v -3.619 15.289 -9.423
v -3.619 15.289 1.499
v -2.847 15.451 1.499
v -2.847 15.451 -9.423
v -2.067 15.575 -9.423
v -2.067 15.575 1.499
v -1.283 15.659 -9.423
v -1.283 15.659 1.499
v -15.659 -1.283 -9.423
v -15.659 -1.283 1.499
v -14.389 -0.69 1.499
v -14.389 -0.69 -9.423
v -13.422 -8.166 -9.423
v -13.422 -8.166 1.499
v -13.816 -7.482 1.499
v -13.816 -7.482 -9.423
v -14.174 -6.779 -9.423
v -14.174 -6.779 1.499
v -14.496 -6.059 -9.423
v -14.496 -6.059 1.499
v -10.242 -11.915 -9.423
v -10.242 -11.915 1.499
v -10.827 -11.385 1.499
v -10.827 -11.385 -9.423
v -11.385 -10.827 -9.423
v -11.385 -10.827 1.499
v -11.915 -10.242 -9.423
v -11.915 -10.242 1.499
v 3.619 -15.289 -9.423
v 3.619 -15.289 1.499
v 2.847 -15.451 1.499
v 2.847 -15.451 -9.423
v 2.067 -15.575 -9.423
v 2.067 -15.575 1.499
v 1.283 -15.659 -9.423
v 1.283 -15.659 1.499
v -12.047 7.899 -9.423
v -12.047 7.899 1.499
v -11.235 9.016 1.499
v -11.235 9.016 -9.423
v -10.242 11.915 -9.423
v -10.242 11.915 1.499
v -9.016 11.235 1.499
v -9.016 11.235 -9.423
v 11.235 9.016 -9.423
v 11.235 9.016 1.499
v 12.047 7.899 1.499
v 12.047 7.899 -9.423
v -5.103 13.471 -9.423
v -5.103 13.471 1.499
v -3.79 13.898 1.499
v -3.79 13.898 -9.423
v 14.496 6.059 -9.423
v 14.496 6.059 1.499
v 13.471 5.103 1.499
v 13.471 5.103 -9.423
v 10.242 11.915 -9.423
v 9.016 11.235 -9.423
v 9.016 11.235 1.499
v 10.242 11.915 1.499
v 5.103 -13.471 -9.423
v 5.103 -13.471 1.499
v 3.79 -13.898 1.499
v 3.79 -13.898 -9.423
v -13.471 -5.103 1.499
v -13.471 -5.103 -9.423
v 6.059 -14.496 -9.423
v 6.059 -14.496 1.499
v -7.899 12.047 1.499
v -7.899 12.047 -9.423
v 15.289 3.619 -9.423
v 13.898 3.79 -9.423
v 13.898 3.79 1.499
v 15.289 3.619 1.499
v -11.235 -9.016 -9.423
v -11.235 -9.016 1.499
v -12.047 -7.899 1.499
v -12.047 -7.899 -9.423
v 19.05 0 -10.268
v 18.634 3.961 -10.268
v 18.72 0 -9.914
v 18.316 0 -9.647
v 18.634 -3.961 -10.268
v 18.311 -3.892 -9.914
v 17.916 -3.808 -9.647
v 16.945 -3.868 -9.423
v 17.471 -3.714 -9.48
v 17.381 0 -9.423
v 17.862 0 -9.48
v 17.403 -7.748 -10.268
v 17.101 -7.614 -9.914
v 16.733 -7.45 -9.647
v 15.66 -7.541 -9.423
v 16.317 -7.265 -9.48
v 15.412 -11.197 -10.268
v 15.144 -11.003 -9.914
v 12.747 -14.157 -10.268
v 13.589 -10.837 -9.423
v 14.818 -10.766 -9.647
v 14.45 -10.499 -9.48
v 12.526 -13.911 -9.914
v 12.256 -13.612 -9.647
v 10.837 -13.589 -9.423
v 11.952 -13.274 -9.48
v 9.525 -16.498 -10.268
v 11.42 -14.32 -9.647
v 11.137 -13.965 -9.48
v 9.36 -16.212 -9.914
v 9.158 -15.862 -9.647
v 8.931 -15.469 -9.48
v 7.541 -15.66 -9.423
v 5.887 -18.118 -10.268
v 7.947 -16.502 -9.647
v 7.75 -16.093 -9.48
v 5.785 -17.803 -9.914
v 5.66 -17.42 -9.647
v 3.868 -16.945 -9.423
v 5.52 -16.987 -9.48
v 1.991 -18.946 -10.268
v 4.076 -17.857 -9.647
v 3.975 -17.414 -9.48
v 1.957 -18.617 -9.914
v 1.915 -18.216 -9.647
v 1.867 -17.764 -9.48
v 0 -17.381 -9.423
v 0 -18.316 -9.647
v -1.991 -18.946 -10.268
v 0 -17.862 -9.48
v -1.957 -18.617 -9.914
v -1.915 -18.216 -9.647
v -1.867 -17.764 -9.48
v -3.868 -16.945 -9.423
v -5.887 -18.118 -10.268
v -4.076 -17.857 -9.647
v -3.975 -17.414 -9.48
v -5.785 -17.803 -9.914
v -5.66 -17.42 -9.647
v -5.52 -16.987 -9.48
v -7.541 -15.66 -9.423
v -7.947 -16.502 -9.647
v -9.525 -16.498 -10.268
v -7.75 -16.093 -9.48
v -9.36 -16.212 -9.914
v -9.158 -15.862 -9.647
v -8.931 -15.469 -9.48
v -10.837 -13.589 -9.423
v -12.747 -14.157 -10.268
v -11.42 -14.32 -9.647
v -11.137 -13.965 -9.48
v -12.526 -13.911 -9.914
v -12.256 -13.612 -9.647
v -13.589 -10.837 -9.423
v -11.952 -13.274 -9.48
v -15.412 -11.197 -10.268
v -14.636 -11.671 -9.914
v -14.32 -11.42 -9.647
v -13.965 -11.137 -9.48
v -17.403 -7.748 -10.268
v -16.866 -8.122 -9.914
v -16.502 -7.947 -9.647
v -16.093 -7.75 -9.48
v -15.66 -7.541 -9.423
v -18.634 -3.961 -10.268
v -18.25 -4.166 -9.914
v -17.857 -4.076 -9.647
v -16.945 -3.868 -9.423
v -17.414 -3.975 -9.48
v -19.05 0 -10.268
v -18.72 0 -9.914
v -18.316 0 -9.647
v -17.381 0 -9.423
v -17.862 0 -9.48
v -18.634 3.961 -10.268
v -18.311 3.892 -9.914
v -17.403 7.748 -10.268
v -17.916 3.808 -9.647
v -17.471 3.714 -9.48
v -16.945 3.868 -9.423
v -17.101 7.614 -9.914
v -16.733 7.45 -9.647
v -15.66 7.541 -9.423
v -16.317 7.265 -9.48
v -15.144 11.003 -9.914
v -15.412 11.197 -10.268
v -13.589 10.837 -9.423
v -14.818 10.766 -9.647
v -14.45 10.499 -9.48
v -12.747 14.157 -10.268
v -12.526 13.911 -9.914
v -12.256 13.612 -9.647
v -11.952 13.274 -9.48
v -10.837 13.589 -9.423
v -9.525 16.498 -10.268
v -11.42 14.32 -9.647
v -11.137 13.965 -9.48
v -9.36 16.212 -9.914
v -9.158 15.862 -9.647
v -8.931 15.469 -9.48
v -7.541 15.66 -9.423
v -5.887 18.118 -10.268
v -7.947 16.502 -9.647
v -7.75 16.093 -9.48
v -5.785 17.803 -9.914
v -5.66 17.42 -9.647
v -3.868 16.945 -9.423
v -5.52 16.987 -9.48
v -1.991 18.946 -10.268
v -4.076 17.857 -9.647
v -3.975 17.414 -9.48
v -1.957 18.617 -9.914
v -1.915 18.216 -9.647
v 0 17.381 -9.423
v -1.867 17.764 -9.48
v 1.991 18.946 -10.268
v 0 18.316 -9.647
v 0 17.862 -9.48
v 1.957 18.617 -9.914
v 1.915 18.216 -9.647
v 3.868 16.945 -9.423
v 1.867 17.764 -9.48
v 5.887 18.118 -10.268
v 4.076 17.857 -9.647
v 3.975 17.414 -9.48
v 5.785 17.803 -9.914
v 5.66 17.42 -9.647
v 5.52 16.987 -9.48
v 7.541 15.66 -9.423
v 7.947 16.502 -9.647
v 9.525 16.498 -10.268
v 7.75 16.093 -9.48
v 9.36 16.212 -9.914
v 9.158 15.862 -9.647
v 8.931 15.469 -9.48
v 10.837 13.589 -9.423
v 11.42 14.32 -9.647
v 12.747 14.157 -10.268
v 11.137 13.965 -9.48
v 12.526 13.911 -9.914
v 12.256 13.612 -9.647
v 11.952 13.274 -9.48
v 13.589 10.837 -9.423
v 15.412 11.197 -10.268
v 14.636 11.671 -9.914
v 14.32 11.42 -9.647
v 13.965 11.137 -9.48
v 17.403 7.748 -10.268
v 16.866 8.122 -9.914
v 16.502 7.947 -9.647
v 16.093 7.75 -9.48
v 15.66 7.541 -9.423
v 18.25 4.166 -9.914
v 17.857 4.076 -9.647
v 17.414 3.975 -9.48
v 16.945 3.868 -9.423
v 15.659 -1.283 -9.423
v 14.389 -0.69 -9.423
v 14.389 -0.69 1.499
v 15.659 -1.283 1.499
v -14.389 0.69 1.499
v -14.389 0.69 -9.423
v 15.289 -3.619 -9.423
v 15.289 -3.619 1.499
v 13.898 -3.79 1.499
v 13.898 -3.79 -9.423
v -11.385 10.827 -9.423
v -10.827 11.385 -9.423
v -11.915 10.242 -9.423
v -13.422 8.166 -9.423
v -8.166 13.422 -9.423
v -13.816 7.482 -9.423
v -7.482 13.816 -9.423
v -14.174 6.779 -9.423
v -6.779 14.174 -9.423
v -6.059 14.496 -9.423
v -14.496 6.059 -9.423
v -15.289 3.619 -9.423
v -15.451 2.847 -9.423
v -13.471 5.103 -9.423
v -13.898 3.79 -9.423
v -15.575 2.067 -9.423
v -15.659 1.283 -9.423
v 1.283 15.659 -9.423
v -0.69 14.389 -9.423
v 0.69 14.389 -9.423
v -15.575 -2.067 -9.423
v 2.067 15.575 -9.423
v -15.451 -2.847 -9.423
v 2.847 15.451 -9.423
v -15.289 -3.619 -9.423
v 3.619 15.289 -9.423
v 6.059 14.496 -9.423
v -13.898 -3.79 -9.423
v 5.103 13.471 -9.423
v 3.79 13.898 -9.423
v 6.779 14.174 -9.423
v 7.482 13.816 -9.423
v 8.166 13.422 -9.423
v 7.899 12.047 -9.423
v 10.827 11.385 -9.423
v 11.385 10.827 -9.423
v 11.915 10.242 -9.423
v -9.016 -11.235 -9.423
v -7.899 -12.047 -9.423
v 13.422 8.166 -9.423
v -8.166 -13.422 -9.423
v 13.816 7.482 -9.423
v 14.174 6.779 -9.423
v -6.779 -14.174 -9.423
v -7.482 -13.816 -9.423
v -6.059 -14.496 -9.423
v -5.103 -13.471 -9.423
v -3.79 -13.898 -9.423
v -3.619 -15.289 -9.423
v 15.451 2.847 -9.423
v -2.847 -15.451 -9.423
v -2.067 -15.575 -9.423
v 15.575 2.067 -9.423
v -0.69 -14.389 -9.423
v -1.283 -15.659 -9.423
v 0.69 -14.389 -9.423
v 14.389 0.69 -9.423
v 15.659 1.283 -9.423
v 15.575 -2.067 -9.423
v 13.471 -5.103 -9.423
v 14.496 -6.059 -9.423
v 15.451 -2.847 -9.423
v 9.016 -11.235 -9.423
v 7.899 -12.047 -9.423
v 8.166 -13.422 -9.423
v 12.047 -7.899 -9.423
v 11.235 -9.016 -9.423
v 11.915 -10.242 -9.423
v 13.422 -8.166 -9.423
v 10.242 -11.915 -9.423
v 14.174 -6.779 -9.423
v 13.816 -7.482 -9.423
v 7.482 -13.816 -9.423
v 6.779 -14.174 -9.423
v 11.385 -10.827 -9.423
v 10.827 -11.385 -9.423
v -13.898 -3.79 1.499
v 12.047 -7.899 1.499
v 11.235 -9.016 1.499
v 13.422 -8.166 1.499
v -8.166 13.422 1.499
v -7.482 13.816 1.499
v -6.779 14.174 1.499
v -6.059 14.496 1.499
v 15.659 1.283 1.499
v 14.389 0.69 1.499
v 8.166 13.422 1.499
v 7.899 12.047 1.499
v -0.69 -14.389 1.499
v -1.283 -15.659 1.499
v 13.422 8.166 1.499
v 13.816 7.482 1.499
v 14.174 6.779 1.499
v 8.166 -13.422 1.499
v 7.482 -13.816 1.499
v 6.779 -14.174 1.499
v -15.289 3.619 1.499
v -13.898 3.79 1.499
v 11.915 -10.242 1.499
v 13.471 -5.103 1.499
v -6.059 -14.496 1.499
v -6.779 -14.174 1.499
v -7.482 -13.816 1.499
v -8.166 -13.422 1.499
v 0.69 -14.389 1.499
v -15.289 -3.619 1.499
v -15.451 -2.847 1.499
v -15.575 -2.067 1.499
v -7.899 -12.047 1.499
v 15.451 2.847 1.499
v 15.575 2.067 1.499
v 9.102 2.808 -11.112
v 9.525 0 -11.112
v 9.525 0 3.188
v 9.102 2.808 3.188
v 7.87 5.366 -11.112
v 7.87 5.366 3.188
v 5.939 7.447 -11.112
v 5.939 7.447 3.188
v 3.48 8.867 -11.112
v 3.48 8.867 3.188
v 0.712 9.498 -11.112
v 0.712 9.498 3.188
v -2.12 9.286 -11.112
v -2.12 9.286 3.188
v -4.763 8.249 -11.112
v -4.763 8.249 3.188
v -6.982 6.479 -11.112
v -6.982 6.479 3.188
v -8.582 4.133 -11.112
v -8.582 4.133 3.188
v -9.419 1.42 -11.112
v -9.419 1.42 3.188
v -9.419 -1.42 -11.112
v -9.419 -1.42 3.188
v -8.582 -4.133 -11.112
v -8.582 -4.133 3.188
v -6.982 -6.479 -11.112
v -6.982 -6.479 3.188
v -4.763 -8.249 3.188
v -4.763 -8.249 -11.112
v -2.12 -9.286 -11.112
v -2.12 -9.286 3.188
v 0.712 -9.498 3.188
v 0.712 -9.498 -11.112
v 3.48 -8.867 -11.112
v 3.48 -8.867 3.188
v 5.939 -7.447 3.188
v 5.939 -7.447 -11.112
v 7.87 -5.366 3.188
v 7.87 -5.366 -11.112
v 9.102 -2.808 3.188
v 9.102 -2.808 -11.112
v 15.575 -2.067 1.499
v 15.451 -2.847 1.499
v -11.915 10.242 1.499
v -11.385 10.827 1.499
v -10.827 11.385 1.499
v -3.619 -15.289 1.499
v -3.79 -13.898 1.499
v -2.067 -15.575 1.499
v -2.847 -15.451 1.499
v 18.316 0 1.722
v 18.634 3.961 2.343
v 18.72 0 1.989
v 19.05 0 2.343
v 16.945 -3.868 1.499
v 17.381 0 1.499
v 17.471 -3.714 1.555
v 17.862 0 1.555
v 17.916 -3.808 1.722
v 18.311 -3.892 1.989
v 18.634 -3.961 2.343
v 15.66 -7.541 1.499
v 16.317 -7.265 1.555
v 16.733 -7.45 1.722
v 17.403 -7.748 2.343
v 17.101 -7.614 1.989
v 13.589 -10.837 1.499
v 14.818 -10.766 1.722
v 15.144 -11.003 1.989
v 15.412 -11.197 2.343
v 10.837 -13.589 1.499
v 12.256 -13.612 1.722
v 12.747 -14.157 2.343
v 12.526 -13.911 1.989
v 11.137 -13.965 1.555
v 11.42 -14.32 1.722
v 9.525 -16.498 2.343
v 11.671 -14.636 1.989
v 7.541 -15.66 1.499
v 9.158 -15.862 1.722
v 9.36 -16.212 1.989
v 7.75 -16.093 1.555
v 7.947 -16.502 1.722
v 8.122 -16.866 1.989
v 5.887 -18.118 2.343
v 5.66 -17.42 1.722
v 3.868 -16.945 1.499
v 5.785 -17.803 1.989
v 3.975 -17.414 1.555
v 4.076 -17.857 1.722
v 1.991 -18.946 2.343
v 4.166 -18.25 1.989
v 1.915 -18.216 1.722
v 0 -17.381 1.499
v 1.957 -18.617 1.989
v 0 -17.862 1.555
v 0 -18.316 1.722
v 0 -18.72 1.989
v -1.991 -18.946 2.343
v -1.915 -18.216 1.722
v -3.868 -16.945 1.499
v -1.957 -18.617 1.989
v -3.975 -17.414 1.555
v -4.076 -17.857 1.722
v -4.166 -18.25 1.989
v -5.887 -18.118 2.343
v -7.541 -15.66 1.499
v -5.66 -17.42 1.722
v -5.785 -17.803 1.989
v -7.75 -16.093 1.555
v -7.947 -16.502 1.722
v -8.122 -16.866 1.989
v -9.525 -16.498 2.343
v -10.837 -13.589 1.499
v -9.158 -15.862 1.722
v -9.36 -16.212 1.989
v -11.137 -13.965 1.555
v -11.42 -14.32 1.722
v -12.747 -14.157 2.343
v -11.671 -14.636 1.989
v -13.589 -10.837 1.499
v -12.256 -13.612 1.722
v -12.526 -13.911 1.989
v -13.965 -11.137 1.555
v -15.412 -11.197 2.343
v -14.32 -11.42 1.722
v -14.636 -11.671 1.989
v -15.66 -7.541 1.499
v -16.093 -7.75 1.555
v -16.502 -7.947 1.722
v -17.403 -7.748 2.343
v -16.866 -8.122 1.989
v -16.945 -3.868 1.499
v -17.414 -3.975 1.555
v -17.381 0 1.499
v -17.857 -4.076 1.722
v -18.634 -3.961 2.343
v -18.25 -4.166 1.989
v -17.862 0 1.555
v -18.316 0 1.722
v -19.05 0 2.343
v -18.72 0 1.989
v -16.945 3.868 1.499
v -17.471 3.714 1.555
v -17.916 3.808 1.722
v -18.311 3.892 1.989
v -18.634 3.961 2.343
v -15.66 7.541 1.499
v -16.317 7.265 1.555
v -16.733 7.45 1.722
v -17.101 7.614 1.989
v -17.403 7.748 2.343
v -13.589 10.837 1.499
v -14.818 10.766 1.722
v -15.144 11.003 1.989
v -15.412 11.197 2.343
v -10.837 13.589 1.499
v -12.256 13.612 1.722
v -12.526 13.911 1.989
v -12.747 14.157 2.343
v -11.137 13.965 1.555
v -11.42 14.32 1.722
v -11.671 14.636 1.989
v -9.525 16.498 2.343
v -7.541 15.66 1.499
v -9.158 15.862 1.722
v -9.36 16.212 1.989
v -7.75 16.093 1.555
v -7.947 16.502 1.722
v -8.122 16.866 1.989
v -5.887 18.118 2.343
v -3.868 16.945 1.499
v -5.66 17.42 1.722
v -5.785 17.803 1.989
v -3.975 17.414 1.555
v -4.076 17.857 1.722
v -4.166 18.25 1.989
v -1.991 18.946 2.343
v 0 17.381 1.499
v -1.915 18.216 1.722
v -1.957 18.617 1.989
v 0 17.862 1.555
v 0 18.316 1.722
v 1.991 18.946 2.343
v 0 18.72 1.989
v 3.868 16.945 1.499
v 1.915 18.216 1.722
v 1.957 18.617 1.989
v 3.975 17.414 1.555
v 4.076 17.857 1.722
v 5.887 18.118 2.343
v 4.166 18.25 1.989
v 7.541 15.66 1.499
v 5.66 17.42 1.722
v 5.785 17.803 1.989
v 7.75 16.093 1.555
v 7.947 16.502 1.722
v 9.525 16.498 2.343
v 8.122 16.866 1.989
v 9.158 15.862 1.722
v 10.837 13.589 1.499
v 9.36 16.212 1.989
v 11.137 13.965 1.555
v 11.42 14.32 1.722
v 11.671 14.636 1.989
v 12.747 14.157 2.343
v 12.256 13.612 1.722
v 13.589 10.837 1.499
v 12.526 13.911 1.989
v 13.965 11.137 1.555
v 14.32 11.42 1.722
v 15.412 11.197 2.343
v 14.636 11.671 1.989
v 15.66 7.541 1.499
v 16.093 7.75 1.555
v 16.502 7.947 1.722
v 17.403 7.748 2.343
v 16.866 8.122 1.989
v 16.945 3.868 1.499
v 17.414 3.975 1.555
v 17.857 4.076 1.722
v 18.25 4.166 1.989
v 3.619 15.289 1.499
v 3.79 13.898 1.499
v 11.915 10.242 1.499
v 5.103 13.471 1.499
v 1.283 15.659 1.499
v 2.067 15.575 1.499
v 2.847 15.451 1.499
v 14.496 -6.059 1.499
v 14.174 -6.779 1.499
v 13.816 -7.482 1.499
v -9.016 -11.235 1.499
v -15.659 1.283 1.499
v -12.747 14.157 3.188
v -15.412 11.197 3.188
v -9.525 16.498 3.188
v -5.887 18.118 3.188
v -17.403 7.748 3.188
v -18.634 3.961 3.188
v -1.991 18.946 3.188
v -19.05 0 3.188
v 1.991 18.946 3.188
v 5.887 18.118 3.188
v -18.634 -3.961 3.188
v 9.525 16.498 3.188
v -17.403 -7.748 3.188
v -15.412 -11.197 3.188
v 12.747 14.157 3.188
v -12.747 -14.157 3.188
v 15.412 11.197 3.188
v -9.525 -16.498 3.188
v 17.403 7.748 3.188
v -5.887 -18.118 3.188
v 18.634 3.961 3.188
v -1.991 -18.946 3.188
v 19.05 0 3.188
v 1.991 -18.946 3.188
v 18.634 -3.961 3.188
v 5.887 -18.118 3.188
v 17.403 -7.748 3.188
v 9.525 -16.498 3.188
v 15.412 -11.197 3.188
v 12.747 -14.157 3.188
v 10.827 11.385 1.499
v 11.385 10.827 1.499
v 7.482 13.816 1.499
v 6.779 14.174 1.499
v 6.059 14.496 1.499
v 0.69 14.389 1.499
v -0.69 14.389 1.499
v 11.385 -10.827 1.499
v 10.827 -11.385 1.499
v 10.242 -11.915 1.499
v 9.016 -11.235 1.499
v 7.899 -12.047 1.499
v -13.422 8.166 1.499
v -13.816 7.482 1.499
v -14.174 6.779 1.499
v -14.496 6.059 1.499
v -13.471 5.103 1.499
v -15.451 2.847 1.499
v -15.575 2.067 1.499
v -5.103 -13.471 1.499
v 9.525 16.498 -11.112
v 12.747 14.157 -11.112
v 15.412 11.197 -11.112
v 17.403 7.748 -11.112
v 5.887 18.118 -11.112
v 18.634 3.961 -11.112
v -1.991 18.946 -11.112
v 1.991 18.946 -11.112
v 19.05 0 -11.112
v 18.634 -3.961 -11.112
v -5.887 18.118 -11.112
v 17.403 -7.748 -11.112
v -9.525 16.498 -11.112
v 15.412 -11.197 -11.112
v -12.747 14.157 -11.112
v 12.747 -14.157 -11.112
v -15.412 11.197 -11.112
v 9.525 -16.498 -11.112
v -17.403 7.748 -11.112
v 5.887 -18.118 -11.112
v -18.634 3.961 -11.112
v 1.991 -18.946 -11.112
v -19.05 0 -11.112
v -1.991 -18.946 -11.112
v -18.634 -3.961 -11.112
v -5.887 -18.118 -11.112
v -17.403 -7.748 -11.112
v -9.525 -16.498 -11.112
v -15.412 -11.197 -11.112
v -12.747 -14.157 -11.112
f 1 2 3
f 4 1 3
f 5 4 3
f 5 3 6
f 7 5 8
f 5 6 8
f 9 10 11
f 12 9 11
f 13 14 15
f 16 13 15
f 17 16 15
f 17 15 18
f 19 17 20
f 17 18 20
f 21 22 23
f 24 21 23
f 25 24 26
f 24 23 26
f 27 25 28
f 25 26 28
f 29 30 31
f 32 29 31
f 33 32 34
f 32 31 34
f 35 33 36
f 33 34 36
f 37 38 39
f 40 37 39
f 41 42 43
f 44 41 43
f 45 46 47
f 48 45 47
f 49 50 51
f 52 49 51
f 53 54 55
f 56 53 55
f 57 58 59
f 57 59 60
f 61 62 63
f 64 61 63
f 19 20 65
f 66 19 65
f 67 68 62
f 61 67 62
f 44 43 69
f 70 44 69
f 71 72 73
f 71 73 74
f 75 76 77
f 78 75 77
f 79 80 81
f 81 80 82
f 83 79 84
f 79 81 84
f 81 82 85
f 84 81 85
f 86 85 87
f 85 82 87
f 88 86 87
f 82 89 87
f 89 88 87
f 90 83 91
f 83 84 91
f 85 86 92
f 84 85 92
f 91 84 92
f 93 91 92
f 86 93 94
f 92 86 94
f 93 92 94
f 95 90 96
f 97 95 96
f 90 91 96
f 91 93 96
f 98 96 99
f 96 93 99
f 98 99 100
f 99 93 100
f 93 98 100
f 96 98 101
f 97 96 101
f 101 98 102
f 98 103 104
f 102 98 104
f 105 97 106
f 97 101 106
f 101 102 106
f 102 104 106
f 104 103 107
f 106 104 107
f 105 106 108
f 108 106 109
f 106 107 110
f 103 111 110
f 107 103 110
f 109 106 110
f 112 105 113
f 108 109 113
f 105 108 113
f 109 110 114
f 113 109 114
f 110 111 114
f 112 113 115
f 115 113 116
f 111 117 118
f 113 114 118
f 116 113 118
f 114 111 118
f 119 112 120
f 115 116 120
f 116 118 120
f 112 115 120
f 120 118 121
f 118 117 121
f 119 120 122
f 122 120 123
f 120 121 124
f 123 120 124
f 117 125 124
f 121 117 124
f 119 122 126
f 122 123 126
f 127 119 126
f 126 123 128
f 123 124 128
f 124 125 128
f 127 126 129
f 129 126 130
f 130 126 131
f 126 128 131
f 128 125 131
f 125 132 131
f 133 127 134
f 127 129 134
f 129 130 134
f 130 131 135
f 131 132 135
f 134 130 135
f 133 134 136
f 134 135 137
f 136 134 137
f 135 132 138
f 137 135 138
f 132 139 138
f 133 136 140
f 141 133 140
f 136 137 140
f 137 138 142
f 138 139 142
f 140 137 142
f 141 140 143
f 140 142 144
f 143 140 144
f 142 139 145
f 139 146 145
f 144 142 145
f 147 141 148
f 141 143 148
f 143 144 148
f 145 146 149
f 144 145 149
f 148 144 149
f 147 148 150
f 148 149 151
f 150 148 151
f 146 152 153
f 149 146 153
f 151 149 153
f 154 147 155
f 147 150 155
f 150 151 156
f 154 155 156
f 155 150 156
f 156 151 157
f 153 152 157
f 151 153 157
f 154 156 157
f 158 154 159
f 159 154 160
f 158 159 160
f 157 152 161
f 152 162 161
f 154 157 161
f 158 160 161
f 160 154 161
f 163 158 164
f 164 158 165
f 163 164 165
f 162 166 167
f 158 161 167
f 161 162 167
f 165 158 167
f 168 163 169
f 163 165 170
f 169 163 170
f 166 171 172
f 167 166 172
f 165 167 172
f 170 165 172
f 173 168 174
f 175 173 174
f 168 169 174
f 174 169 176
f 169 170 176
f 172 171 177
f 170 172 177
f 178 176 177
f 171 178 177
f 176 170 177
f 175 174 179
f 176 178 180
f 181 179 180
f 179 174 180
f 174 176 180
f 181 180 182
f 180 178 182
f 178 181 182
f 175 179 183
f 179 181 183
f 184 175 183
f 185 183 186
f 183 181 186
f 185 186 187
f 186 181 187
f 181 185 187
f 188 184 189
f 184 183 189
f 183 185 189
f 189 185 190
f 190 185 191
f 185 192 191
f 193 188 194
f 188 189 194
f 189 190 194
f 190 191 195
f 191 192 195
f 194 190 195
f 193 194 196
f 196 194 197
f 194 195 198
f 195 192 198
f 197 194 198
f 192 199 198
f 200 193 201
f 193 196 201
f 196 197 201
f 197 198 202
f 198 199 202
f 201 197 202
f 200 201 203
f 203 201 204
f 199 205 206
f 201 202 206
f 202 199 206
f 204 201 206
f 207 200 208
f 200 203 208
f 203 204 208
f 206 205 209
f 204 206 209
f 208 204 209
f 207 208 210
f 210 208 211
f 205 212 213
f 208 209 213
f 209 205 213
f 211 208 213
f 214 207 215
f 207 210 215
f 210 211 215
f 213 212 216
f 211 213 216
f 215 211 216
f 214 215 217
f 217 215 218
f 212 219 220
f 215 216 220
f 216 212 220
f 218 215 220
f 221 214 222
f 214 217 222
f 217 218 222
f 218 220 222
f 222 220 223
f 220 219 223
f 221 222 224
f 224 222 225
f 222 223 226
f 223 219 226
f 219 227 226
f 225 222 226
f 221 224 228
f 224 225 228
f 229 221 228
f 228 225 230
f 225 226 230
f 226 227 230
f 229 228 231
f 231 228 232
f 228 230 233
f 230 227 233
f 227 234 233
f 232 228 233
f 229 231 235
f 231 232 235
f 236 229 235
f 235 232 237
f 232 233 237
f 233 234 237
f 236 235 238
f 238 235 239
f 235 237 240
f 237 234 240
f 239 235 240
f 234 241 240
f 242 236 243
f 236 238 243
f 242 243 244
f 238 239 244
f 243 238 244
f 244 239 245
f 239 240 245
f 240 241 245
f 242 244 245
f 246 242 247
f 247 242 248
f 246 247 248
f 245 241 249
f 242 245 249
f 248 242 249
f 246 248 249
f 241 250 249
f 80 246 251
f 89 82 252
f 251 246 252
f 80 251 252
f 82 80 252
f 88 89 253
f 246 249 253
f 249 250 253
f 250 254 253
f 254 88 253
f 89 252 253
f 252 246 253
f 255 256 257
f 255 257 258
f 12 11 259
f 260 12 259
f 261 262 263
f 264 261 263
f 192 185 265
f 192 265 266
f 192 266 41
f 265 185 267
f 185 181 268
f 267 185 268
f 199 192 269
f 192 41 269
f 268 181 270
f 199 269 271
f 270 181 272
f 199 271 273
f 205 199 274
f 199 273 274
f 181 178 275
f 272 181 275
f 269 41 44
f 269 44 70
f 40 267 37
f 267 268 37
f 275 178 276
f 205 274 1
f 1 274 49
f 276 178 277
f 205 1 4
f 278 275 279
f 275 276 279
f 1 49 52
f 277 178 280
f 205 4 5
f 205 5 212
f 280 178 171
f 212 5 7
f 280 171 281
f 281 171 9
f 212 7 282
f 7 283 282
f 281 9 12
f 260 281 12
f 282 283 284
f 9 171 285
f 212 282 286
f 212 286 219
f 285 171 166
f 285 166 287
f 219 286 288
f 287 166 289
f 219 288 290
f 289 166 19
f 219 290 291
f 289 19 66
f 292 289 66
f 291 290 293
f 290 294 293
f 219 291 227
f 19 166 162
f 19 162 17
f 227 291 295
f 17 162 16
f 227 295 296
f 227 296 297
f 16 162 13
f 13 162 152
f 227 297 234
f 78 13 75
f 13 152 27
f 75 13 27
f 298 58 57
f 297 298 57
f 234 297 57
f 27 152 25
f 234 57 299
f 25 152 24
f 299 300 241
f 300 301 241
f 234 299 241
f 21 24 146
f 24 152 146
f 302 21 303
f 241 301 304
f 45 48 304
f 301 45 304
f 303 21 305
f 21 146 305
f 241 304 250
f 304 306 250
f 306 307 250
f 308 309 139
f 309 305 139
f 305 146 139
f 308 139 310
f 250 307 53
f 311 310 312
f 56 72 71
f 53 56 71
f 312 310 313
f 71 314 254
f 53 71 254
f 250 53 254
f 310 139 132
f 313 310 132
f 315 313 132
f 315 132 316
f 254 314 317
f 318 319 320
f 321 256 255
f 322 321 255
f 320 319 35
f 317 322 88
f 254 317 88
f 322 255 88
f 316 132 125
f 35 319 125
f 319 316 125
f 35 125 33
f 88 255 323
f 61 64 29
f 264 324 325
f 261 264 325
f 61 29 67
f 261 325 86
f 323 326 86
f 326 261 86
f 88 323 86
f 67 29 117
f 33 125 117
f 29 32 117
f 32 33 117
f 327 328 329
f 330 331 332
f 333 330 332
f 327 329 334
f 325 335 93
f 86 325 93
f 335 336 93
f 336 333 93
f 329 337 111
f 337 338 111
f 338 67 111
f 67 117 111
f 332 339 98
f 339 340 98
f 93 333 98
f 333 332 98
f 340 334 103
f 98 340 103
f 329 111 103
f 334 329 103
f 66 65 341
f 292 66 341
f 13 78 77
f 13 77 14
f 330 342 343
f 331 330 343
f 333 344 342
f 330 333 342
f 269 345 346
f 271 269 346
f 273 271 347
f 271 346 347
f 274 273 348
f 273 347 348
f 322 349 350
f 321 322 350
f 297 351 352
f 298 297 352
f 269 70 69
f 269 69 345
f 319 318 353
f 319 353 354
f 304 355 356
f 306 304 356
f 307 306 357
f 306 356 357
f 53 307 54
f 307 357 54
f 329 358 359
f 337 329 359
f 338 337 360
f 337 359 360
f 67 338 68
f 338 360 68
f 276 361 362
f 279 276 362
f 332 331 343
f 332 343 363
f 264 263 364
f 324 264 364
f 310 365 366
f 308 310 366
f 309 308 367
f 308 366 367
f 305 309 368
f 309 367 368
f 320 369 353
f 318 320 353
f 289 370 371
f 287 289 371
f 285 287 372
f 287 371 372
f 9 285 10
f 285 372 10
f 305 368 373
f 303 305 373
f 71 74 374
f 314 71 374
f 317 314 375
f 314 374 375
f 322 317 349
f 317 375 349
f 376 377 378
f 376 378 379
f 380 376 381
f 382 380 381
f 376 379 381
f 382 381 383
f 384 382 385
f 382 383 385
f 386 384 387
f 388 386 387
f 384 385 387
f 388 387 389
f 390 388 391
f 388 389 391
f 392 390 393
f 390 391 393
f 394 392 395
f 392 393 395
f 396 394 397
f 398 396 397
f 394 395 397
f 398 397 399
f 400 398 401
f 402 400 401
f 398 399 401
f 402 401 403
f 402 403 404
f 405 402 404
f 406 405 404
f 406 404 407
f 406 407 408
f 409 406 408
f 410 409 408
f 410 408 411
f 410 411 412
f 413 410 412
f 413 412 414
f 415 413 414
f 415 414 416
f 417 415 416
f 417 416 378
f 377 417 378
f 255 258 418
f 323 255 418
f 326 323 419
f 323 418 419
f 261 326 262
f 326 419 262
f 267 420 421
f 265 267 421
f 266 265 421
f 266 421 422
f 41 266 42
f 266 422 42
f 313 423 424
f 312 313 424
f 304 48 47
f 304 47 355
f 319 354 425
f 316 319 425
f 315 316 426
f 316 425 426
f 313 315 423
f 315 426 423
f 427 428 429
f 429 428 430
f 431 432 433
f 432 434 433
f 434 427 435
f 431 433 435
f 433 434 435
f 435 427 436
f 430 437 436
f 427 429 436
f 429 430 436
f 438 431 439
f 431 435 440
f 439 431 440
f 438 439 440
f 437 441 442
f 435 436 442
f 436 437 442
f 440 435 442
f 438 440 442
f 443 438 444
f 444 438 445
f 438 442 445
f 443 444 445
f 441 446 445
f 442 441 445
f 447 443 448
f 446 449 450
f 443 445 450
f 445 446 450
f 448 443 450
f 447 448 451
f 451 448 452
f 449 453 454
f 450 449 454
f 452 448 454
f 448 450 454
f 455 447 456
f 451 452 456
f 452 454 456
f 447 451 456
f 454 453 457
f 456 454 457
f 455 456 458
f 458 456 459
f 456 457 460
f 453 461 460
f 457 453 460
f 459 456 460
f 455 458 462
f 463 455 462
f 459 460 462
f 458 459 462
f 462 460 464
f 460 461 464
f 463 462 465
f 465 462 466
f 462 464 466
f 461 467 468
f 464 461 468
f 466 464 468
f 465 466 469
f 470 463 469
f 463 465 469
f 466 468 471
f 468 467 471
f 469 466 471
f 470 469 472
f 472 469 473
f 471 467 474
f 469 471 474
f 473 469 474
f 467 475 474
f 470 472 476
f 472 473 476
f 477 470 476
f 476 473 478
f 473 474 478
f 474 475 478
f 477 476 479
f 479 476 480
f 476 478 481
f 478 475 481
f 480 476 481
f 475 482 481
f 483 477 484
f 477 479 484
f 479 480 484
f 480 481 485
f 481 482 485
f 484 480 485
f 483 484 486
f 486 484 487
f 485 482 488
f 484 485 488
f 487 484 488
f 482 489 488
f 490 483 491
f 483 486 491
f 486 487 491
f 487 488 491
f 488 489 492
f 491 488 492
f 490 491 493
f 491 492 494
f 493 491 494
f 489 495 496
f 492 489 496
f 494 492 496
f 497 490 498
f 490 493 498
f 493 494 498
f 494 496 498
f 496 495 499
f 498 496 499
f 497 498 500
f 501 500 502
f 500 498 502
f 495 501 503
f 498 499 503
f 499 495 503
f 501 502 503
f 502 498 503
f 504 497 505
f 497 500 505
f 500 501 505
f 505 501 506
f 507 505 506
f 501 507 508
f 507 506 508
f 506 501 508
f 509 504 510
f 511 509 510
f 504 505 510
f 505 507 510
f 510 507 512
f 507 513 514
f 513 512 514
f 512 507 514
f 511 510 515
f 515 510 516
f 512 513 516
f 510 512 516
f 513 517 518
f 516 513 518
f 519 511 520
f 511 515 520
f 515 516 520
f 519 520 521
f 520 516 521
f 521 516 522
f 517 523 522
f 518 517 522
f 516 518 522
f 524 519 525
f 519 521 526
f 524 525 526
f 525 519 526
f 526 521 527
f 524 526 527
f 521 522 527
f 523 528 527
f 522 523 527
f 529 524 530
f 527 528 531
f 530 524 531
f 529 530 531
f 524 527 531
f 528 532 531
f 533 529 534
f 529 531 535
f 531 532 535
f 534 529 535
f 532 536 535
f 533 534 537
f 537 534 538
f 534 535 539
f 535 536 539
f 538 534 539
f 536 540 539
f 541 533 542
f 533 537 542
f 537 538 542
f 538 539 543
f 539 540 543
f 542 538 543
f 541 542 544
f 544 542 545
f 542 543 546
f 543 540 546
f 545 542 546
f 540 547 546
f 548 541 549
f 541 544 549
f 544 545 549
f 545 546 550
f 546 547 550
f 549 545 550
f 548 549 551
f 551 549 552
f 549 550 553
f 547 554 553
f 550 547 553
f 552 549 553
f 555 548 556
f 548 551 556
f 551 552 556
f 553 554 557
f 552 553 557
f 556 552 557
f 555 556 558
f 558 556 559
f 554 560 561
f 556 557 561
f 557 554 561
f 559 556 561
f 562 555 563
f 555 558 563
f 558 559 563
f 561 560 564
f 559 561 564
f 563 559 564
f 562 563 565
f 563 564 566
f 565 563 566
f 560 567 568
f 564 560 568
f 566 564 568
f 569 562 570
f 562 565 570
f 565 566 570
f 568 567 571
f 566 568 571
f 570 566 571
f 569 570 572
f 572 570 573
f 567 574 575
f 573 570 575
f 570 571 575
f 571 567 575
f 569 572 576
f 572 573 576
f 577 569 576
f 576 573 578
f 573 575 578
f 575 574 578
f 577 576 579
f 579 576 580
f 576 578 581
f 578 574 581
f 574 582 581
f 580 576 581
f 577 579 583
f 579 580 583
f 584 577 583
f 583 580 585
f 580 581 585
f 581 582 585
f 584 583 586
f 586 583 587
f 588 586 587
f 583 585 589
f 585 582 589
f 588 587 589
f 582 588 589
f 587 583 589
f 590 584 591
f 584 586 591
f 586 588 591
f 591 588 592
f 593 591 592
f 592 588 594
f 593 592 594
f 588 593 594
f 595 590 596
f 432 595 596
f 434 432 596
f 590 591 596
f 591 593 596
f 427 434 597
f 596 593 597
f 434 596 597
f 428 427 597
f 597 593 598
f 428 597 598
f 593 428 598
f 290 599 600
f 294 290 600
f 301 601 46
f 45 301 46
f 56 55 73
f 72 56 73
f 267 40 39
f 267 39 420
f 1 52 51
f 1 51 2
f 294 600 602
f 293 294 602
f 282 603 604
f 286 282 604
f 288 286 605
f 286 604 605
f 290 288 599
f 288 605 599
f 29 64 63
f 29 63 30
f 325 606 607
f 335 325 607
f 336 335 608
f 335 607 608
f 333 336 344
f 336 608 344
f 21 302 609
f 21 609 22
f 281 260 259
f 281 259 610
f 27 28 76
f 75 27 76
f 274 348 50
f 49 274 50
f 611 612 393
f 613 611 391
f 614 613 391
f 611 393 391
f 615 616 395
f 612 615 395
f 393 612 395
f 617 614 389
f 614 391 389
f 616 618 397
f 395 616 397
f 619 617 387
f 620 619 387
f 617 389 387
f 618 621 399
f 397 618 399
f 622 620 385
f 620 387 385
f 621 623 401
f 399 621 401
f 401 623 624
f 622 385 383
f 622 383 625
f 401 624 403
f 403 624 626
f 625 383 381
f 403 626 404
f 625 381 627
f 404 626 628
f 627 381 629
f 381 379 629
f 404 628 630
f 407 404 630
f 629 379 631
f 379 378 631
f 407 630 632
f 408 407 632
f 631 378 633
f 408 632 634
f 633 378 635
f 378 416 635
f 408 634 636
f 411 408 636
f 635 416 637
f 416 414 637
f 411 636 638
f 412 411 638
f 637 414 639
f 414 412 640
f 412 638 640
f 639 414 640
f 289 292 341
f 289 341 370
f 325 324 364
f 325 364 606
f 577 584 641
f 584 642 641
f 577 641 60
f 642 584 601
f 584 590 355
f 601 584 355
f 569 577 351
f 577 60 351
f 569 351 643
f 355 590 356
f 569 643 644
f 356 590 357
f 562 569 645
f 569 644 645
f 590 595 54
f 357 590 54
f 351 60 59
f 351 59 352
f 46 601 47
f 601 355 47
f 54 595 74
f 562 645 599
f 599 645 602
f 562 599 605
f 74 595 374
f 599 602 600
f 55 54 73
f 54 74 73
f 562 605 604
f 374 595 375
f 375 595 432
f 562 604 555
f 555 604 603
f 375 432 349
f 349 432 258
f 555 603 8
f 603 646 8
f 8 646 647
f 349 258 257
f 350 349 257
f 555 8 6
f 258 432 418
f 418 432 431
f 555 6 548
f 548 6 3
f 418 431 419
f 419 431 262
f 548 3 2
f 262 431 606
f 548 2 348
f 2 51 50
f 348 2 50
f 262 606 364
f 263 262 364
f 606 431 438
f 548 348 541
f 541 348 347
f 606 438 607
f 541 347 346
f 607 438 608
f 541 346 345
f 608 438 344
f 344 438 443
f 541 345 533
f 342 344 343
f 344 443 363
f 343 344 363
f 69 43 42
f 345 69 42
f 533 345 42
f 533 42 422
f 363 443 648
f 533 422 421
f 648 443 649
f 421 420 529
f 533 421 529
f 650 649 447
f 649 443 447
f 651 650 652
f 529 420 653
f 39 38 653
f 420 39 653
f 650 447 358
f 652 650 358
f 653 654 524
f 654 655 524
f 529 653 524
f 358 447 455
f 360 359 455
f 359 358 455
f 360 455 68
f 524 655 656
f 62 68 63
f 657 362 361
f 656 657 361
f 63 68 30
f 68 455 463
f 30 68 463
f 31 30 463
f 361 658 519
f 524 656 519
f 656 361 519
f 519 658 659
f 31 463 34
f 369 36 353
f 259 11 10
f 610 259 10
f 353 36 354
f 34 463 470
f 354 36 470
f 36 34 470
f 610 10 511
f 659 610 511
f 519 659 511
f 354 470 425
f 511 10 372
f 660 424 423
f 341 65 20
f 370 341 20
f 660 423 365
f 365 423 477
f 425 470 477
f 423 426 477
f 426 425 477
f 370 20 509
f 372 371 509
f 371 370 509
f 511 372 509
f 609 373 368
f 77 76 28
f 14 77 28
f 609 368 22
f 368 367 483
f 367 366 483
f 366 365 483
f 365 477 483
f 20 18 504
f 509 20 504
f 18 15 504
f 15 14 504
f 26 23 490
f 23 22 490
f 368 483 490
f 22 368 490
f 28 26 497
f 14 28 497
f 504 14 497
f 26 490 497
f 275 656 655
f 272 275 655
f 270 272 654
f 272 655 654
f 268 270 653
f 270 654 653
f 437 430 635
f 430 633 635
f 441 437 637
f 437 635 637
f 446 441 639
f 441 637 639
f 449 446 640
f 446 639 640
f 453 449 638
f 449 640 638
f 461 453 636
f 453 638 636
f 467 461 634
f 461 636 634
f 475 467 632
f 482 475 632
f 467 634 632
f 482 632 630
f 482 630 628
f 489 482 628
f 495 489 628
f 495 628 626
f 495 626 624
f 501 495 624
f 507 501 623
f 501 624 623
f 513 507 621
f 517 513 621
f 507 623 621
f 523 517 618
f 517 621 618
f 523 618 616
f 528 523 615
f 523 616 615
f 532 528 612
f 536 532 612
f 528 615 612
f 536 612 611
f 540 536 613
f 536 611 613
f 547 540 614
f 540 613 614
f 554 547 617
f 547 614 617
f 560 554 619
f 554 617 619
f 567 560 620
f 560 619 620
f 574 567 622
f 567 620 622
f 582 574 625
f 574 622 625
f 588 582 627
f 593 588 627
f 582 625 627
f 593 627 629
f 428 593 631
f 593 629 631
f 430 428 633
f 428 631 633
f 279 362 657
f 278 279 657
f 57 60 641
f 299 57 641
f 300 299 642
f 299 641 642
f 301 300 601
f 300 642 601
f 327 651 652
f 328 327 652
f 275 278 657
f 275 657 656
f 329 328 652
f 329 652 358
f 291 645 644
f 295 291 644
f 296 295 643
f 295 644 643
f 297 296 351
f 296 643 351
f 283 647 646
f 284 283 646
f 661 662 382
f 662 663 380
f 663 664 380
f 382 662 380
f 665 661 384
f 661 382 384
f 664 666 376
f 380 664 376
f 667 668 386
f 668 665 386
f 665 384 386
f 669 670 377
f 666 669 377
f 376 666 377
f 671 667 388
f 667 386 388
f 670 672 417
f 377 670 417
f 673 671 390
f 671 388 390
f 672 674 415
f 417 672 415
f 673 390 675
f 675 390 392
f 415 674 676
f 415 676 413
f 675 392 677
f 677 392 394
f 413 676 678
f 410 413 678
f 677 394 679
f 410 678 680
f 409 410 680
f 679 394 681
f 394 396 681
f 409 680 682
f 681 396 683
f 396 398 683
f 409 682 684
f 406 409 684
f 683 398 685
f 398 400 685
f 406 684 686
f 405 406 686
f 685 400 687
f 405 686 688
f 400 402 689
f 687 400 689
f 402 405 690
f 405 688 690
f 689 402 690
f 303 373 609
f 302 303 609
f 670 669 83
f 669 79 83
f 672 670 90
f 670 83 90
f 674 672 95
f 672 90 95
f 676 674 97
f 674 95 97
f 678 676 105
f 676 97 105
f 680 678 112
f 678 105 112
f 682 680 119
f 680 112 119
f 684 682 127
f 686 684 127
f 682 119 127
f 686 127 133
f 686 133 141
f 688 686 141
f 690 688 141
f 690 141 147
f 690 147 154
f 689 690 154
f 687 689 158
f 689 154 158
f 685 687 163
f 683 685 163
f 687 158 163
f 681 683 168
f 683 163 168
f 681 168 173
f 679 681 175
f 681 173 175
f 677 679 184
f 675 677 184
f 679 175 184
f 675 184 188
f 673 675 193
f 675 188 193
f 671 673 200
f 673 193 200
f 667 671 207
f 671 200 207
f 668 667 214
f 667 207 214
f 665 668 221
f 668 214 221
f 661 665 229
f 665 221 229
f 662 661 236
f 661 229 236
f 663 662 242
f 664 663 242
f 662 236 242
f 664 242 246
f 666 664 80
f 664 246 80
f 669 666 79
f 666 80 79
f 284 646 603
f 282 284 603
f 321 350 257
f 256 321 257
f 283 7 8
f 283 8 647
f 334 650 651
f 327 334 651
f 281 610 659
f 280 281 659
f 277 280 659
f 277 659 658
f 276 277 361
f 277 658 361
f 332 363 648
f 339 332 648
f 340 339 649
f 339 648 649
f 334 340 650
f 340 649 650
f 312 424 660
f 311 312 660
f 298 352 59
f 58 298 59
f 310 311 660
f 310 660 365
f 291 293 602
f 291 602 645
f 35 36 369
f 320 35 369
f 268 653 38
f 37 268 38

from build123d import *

# Parameters (mm, degrees)
CUT_EXTRUDE1_START = 1.4986
CUT_EXTRUDE1_DEPTH = 10.922
CIRPATTERN1_COUNT  = 20
SKETCH4_R          = 9.525
CUT_EXTRUDE2_DEPTH = 31.500831465


with BuildPart() as part:
    # Sketch2 → Revolve1 (revolve)
    with BuildSketch(Plane(origin=(0, 0, 0), x_dir=(0, 0, -1), z_dir=(1, 0, 0)), mode=Mode.PRIVATE) as revolve1_sk:
        with BuildLine():
            Line((-3.1877, 3.175), (11.1125, 3.175))
            Line((11.1125, 3.175), (11.1125, 19.05))
            Line((11.1125, 19.05), (10.26795, 19.05))
            ThreePointArc((10.26795, 19.05), (9.646555263, 18.316132165), (9.4234, 17.380773865))
            Line((9.4234, 17.380773865), (9.4234, 15.711547731))
            Line((9.4234, 15.711547731), (-1.4986, 15.711547731))
            Line((-1.4986, 15.711547731), (-1.4986, 17.380773865))
            ThreePointArc((-1.4986, 17.380773865), (-1.721755263, 18.316132165), (-2.34315, 19.05))
            Line((-2.34315, 19.05), (-3.1877, 19.05))
            Line((-3.1877, 19.05), (-3.1877, 11.8999))
            Line((-3.1877, 11.8999), (-3.1877, 3.175))
        make_face()
    revolve(revolve1_sk.sketch.rotate(Axis((0, 0, 11.1125), (0, 0, -1)), 90), axis=Axis((0, 0, 11.1125), (0, 0, -1)))

    # Sketch3 → Cut-Extrude1 (cut)
    with BuildSketch(Plane.XY.offset(CUT_EXTRUDE1_START)):
        with BuildLine():
            Line((-0.690489274, 14.3891), (0.690489274, 14.3891))
            Line((0.690489274, 14.3891), (1.2827, 15.6591))
            ThreePointArc((1.2827, 15.6591), (0, 15.711547731), (-1.2827, 15.6591))
            Line((-1.2827, 15.6591), (-0.690489274, 14.3891))
        make_face()
    cut_extrude1 = extrude(amount=-CUT_EXTRUDE1_DEPTH, mode=Mode.SUBTRACT)

    # CirPattern1: Cut-Extrude1 ×20 about axis
    cirpattern1_axis = Axis((0, 0, 0), (0, 0, 1))
    for i in range(1, CIRPATTERN1_COUNT):
        add(cut_extrude1.rotate(cirpattern1_axis, i * 360 / CIRPATTERN1_COUNT), mode=Mode.SUBTRACT)

    # Sketch4 → Cut-Extrude2 (cut, through all)
    with BuildSketch(Plane.XY.offset(3.1877)):
        Circle(SKETCH4_R)
    extrude(amount=-CUT_EXTRUDE2_DEPTH, mode=Mode.SUBTRACT)


solid = part.part
